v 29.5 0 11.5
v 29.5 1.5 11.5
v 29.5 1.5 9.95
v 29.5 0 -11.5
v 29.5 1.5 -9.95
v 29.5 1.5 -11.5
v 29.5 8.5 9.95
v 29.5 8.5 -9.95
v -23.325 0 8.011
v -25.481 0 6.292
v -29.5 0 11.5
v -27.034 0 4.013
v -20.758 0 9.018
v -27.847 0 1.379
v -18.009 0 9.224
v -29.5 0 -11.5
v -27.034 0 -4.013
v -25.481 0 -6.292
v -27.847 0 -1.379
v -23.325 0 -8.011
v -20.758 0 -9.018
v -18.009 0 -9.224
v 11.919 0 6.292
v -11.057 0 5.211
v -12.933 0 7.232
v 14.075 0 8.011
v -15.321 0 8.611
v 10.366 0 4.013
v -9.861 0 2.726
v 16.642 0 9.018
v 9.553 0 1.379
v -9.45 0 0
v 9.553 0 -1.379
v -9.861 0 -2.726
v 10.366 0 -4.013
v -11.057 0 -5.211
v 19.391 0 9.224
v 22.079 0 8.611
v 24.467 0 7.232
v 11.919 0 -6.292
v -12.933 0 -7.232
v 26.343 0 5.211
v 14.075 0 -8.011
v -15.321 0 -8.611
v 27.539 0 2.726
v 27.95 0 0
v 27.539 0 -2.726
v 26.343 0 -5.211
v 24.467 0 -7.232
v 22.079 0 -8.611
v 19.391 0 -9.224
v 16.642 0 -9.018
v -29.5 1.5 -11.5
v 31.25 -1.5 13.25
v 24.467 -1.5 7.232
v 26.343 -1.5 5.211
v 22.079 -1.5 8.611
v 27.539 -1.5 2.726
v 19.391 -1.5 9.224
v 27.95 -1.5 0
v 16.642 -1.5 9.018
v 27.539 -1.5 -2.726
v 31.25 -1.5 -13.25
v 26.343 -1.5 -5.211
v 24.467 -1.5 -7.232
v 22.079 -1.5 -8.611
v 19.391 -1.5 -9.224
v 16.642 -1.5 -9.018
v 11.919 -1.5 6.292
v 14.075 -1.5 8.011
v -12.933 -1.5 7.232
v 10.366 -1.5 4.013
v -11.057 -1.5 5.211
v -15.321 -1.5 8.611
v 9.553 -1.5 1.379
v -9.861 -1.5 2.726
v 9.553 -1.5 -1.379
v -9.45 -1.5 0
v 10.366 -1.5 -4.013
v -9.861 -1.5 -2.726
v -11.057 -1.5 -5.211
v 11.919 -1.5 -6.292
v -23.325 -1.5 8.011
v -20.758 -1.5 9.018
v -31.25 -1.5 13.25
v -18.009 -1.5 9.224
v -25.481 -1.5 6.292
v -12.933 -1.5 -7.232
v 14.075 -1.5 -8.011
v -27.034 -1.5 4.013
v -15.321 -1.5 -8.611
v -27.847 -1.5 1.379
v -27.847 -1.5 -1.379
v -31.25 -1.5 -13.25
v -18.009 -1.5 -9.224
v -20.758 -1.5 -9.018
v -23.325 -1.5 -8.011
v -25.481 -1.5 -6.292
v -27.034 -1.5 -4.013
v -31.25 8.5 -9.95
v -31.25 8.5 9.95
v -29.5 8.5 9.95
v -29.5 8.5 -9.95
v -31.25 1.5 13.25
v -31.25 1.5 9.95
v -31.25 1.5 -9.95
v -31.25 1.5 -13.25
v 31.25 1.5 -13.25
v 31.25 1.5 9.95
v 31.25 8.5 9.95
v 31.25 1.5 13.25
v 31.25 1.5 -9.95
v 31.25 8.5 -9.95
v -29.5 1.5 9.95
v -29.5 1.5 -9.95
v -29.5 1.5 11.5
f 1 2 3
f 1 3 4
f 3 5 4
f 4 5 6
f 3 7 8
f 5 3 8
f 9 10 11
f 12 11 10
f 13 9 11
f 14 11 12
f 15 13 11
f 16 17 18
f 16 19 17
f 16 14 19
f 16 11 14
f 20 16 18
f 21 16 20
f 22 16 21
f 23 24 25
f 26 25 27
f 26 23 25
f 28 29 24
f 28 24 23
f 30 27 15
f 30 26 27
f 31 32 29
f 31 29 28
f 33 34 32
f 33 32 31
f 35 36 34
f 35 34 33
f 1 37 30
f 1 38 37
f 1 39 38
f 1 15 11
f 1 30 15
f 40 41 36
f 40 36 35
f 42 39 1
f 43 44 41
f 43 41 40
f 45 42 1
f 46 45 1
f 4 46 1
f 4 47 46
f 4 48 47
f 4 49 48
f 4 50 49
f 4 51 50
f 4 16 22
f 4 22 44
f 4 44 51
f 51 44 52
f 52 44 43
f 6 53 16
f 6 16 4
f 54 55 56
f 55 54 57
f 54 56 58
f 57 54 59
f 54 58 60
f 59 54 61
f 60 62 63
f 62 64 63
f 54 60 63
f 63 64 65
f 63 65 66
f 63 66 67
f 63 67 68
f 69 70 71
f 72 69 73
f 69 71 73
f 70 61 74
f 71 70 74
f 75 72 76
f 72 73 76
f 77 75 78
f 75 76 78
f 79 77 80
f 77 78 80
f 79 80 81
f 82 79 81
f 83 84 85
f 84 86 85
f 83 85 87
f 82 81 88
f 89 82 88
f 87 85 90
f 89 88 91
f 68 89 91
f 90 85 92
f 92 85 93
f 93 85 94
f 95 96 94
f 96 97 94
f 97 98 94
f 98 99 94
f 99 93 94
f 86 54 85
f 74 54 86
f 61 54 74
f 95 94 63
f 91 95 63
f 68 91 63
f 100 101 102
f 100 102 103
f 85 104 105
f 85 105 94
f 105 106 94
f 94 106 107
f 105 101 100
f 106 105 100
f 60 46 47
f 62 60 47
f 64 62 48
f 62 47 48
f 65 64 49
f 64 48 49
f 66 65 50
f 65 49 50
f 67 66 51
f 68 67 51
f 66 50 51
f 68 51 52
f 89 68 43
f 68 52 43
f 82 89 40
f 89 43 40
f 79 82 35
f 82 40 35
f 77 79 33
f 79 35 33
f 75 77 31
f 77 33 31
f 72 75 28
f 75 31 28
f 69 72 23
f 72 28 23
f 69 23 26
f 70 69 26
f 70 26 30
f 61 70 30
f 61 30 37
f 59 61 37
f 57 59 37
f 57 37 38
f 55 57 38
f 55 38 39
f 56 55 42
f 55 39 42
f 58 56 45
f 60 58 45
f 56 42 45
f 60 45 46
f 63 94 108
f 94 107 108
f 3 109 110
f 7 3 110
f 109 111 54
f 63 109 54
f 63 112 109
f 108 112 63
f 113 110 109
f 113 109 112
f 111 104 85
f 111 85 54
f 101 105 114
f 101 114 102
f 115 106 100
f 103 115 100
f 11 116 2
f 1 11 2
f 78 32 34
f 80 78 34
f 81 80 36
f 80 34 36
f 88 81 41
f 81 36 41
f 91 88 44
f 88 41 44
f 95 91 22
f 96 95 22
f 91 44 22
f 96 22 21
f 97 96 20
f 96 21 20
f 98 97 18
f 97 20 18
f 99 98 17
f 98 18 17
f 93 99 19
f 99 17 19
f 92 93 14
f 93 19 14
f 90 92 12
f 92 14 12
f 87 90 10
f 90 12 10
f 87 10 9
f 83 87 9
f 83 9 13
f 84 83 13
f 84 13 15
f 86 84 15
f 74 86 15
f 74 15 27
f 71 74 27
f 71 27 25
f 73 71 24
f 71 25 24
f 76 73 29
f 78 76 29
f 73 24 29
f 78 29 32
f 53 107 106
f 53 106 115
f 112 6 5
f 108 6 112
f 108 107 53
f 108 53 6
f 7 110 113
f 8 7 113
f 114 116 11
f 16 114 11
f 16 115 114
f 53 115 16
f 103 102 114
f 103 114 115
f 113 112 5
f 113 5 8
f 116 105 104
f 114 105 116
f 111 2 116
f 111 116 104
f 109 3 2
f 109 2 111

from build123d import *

# Parameters (mm, degrees)
CROQUIS1_W              = 62.5
CROQUIS1_H              = 26.5
SALIENTE_EXTRUIR1_DEPTH = 1.5
CORTAR_EXTRUIR1_START   = 1.5
CROQUIS4_W              = 59
CROQUIS4_H              = 23
CORTAR_EXTRUIR1_DEPTH   = 1.5
CROQUIS5_R              = 9.25
CORTAR_EXTRUIR2_DEPTH   = 1.5
SALIENTE_EXTRUIR2_START = 31.25
CROQUIS6_W              = 19.9
CROQUIS6_H              = 10
SALIENTE_EXTRUIR2_DEPTH = 1.75
SALIENTE_EXTRUIR3_START = -31.25
CROQUIS6_3_W            = 19.9
CROQUIS6_3_H            = 10
SALIENTE_EXTRUIR3_DEPTH = 1.75


with BuildPart() as part:
    # Croquis1 → Saliente-Extruir1 (new body, symmetric)
    with BuildSketch(Plane(origin=(0, 0, 0), x_dir=(1, 0, 0), z_dir=(0, 1, 0))):
        Rectangle(CROQUIS1_W, CROQUIS1_H)
    extrude(amount=SALIENTE_EXTRUIR1_DEPTH, both=True)

    # Croquis4 → Cortar-Extruir1 (cut)
    with BuildSketch(Plane(origin=(0, 0, 0), x_dir=(1, 0, 0), z_dir=(0, 1, 0)).offset(CORTAR_EXTRUIR1_START)):
        Rectangle(CROQUIS4_W, CROQUIS4_H)
    extrude(amount=-CORTAR_EXTRUIR1_DEPTH, mode=Mode.SUBTRACT)

    # Croquis5 → Cortar-Extruir2 (cut)
    with BuildSketch(Plane(origin=(0, 0, 0), x_dir=(1, 0, 0), z_dir=(0, 1, 0))):
        with Locations((-18.7, 0)):
            Circle(CROQUIS5_R)
        with Locations((18.7, 0)):
            Circle(CROQUIS5_R)
    extrude(amount=-CORTAR_EXTRUIR2_DEPTH, mode=Mode.SUBTRACT)

    # Croquis6 → Saliente-Extruir2 (add)
    with BuildSketch(Plane(origin=(0, 0, 0), x_dir=(0, 0, -1), z_dir=(1, 0, 0)).offset(SALIENTE_EXTRUIR2_START)):
        with Locations((0, 3.5)):
            Rectangle(CROQUIS6_W, CROQUIS6_H)
    extrude(amount=-SALIENTE_EXTRUIR2_DEPTH)

    # Croquis6<3> → Saliente-Extruir3 (add)
    with BuildSketch(Plane(origin=(0, 0, 0), x_dir=(0, 0, -1), z_dir=(1, 0, 0)).offset(SALIENTE_EXTRUIR3_START)):
        with Locations((0, 3.5)):
            Rectangle(CROQUIS6_3_W, CROQUIS6_3_H)
    extrude(amount=SALIENTE_EXTRUIR3_DEPTH)


solid = part.part
